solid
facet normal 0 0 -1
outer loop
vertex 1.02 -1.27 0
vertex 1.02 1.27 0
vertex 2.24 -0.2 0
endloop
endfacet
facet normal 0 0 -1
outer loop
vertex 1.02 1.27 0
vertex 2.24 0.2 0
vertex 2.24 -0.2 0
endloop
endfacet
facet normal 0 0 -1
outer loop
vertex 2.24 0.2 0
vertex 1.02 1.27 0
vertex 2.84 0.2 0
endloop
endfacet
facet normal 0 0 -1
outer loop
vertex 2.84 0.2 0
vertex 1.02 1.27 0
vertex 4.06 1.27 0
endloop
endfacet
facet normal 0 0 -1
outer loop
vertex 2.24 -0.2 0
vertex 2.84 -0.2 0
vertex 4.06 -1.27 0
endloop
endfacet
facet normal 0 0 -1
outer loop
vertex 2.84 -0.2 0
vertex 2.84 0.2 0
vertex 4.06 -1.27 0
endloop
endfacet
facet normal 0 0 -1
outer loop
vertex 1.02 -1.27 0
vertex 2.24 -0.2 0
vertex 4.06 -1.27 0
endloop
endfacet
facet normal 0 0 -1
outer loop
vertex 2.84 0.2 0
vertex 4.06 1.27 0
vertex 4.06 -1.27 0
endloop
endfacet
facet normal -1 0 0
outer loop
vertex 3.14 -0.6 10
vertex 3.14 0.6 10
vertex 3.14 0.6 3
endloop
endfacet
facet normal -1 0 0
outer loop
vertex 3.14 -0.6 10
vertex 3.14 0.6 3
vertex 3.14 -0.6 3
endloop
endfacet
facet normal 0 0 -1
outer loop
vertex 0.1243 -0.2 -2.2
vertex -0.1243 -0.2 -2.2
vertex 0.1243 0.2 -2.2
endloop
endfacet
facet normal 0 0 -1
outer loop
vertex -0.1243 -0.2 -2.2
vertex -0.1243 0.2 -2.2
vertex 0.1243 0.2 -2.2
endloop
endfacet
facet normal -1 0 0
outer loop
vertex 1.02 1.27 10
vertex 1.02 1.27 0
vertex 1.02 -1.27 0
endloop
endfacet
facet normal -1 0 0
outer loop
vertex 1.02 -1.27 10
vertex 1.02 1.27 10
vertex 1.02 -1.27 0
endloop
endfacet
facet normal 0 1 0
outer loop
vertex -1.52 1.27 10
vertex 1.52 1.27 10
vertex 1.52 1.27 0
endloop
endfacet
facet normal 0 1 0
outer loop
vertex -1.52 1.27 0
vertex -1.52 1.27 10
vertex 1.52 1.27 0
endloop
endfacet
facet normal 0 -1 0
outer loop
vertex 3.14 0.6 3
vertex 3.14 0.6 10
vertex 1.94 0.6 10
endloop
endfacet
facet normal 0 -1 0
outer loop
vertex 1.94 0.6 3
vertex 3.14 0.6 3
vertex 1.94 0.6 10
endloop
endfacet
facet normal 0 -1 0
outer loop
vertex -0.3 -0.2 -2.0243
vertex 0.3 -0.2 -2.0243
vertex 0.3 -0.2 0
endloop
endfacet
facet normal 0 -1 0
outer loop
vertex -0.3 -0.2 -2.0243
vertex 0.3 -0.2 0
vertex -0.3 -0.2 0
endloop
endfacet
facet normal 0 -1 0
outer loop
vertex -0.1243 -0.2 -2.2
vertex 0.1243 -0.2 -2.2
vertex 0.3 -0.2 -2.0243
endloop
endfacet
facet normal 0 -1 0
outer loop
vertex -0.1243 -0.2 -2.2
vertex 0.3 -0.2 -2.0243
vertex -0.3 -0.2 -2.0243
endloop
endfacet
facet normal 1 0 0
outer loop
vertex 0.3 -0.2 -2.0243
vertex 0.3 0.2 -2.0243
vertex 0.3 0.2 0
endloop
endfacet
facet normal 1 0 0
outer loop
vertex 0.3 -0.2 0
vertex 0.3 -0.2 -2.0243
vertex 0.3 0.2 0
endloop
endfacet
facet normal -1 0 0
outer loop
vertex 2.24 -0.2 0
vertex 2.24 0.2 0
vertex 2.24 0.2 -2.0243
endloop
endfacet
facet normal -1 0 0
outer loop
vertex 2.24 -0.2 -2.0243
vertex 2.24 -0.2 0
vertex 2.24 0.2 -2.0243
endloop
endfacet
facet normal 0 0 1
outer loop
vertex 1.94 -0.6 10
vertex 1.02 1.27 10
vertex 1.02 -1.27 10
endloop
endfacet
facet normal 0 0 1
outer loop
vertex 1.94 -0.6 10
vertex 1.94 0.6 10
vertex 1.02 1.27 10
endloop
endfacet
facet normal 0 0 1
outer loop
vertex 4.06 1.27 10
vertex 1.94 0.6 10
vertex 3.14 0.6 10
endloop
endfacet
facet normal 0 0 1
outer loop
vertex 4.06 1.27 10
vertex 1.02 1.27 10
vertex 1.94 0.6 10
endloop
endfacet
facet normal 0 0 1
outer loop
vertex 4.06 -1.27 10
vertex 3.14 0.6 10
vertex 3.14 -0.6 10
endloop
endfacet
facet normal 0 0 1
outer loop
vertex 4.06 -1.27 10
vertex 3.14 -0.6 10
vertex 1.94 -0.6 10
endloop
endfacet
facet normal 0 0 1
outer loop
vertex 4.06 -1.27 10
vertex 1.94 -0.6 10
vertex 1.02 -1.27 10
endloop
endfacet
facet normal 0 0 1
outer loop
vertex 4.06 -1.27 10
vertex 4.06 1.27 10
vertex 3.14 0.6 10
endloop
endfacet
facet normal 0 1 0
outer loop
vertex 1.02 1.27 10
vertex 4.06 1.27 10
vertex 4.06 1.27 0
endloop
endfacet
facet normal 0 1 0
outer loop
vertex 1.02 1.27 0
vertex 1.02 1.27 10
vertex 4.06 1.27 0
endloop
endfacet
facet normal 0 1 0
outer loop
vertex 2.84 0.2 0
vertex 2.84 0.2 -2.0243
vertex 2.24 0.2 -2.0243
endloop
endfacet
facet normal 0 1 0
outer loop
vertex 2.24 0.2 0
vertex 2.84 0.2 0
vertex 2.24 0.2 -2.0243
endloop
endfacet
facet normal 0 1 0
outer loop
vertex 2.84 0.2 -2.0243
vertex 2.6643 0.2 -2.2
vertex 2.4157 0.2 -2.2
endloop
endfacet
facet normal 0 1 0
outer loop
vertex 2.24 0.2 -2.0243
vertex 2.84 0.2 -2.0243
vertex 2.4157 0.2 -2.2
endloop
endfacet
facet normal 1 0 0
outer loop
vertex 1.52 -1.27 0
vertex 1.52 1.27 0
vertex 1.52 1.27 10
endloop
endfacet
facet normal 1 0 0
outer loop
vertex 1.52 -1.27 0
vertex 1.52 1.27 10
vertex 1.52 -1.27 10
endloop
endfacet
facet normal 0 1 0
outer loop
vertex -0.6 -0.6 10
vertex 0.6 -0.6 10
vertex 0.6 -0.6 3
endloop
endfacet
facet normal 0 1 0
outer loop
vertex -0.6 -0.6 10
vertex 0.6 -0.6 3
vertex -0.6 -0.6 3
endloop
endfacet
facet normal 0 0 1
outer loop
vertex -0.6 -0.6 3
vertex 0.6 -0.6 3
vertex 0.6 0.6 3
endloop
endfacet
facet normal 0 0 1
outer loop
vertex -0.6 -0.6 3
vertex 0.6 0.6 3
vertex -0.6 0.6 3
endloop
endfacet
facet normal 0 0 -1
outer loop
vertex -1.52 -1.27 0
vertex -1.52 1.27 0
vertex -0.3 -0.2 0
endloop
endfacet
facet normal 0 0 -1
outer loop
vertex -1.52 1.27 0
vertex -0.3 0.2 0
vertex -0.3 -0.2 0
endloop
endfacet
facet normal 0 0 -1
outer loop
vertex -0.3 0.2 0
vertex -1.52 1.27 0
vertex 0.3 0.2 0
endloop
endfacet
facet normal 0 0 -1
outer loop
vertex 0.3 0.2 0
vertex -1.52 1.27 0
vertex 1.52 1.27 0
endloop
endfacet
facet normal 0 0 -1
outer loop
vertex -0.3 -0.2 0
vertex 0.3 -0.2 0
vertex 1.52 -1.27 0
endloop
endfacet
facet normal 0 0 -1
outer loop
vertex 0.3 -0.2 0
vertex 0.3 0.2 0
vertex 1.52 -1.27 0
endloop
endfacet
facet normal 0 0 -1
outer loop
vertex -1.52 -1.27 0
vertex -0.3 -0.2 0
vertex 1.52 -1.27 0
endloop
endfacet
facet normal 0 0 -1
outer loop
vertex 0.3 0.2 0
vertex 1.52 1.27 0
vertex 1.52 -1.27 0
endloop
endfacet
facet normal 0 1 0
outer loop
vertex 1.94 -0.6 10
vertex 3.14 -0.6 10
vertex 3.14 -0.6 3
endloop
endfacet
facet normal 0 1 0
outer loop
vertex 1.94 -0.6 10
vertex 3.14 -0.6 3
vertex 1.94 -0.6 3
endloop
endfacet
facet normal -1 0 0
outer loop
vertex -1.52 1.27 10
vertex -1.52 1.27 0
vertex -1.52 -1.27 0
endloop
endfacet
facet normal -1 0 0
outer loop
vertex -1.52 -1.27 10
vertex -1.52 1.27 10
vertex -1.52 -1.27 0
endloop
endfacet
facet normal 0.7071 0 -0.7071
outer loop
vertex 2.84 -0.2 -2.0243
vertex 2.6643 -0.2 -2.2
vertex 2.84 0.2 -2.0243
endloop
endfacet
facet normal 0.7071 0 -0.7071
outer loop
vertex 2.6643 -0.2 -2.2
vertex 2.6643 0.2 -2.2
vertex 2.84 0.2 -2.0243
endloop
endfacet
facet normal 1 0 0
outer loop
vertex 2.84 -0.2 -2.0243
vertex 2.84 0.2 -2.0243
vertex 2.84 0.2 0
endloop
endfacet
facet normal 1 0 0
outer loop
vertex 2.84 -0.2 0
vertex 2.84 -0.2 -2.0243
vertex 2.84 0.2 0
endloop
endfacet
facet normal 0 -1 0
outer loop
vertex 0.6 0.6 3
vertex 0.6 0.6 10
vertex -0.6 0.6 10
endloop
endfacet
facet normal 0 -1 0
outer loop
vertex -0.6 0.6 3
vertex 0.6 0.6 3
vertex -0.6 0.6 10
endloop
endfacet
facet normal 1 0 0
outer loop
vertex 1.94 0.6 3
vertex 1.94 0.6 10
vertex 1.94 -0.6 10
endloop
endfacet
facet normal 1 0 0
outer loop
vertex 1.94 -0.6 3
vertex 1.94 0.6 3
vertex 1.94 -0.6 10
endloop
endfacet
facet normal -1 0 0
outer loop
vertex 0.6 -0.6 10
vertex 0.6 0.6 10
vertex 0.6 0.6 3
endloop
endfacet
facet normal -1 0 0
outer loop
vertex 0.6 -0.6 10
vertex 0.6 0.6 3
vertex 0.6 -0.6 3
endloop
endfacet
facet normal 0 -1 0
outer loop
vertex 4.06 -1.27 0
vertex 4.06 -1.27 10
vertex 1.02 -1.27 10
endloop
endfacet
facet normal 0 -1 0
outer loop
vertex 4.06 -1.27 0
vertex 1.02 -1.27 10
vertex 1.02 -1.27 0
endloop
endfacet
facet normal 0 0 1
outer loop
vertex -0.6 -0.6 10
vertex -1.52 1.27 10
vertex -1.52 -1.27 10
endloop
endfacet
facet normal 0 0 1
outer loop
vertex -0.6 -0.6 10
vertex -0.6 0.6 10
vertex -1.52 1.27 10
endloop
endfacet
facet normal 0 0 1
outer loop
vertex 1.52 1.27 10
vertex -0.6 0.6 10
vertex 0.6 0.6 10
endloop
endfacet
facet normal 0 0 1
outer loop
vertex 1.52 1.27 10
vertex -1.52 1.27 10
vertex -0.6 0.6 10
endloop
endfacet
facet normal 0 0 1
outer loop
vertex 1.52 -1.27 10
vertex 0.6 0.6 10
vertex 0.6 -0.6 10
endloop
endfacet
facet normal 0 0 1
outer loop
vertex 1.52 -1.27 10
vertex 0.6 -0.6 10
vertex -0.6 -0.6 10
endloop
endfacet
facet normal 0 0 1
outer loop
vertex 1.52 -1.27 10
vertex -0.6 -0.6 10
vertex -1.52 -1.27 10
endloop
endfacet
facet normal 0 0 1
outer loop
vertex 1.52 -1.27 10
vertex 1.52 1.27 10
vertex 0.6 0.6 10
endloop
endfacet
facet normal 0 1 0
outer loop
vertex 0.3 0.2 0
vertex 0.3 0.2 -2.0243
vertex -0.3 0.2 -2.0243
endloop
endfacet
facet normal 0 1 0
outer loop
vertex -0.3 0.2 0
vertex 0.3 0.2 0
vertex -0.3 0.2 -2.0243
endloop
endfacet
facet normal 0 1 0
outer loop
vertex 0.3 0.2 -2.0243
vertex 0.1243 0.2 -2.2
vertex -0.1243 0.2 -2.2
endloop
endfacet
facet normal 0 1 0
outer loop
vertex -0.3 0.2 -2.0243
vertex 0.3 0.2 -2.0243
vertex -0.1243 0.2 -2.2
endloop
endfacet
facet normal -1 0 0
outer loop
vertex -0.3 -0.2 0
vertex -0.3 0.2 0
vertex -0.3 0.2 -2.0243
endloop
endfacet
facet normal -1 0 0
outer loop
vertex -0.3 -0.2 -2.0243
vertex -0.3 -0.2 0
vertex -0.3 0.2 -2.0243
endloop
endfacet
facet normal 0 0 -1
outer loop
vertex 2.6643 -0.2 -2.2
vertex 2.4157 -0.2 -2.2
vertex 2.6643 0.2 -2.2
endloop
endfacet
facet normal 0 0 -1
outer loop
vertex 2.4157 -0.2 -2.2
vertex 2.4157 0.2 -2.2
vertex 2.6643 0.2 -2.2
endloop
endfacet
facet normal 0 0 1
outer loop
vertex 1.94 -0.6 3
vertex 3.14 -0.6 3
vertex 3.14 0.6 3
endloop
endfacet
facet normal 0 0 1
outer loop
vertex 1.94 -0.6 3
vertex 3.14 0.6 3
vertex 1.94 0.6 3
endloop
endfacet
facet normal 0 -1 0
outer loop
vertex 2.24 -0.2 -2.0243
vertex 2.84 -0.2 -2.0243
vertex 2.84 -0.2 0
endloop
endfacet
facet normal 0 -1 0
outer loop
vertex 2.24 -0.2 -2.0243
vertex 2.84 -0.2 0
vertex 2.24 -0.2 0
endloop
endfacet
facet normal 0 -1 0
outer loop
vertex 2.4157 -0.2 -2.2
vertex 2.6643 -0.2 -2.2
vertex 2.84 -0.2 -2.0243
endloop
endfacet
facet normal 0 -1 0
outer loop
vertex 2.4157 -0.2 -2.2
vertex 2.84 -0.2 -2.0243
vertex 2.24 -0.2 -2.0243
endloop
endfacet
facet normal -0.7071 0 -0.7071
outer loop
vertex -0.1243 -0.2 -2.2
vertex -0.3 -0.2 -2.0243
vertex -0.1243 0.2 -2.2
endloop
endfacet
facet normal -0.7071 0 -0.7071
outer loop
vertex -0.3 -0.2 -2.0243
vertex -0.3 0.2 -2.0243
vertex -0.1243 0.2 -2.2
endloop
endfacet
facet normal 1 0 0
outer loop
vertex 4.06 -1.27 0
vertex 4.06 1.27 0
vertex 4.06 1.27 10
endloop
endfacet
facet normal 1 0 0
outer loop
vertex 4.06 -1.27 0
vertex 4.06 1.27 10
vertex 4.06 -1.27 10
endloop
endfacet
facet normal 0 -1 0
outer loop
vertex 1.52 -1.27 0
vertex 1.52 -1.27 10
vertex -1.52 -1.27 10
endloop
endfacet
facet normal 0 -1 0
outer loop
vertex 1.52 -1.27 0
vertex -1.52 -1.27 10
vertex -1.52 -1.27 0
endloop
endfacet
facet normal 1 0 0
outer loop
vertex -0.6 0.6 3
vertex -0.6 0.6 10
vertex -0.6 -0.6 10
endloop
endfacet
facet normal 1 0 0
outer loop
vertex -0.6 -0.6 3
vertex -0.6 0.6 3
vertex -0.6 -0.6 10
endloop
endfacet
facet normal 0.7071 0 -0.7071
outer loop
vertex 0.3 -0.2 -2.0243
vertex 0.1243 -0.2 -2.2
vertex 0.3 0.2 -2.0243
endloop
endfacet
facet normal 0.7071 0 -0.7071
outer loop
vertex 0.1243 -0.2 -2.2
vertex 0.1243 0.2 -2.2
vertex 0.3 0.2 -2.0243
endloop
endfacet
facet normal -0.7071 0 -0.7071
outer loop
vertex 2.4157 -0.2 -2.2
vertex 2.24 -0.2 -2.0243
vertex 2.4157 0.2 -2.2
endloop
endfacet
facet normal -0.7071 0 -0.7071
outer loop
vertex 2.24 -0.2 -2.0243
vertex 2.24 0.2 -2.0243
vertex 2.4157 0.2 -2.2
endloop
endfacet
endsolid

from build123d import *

# Parameters (mm, degrees)
SKETCH1_W           = 2.54
SKETCH1_H           = 10
BOSS_EXTRUDE1_DEPTH = 1.52
SKETCH2_W           = 1.2
SKETCH2_H           = 1.2
CUT_EXTRUDE1_DEPTH  = 7
BOSS_EXTRUDE2_DEPTH = 0.2
LPATTERN1_COUNT     = 2
LPATTERN1_PITCH     = 2.54


with BuildPart() as part:
    # Sketch1 → Boss-Extrude1 (new, symmetric)
    with BuildSketch(Plane(origin=(0, 0, 0), x_dir=(0, -1, 0), z_dir=(1, 0, 0))):
        with Locations((0, -5)):
            Rectangle(SKETCH1_W, SKETCH1_H)
    extrude(amount=BOSS_EXTRUDE1_DEPTH, both=True)

    # Sketch2 → Cut-Extrude1 (cut)
    with BuildSketch(Plane(origin=(0, 0, 10), x_dir=(-1, 0, 0), z_dir=(0, 0, 1))):
        Rectangle(SKETCH2_W, SKETCH2_H)
    extrude(amount=-CUT_EXTRUDE1_DEPTH, mode=Mode.SUBTRACT)

    # Sketch3 → Boss-Extrude2 (add, symmetric)
    with BuildSketch(Plane(origin=(0, 0, 0), x_dir=(1, 0, 0), z_dir=(0, 1, 0))):
        Polygon((-0.3, 0), (-0.3, 2.024264069), (-0.124264069, 2.2), (0.124264069, 2.2), (0.3, 2.024264069), (0.3, 0), align=None)
    extrude(amount=BOSS_EXTRUDE2_DEPTH, both=True)


with BuildPart() as lpattern1_1:
    # LPattern1: pattern copy
    add(part.part.moved(Location(Vector(1, 0, 0) * (1 * LPATTERN1_PITCH))))


solid = Compound([part.part, lpattern1_1.part])
